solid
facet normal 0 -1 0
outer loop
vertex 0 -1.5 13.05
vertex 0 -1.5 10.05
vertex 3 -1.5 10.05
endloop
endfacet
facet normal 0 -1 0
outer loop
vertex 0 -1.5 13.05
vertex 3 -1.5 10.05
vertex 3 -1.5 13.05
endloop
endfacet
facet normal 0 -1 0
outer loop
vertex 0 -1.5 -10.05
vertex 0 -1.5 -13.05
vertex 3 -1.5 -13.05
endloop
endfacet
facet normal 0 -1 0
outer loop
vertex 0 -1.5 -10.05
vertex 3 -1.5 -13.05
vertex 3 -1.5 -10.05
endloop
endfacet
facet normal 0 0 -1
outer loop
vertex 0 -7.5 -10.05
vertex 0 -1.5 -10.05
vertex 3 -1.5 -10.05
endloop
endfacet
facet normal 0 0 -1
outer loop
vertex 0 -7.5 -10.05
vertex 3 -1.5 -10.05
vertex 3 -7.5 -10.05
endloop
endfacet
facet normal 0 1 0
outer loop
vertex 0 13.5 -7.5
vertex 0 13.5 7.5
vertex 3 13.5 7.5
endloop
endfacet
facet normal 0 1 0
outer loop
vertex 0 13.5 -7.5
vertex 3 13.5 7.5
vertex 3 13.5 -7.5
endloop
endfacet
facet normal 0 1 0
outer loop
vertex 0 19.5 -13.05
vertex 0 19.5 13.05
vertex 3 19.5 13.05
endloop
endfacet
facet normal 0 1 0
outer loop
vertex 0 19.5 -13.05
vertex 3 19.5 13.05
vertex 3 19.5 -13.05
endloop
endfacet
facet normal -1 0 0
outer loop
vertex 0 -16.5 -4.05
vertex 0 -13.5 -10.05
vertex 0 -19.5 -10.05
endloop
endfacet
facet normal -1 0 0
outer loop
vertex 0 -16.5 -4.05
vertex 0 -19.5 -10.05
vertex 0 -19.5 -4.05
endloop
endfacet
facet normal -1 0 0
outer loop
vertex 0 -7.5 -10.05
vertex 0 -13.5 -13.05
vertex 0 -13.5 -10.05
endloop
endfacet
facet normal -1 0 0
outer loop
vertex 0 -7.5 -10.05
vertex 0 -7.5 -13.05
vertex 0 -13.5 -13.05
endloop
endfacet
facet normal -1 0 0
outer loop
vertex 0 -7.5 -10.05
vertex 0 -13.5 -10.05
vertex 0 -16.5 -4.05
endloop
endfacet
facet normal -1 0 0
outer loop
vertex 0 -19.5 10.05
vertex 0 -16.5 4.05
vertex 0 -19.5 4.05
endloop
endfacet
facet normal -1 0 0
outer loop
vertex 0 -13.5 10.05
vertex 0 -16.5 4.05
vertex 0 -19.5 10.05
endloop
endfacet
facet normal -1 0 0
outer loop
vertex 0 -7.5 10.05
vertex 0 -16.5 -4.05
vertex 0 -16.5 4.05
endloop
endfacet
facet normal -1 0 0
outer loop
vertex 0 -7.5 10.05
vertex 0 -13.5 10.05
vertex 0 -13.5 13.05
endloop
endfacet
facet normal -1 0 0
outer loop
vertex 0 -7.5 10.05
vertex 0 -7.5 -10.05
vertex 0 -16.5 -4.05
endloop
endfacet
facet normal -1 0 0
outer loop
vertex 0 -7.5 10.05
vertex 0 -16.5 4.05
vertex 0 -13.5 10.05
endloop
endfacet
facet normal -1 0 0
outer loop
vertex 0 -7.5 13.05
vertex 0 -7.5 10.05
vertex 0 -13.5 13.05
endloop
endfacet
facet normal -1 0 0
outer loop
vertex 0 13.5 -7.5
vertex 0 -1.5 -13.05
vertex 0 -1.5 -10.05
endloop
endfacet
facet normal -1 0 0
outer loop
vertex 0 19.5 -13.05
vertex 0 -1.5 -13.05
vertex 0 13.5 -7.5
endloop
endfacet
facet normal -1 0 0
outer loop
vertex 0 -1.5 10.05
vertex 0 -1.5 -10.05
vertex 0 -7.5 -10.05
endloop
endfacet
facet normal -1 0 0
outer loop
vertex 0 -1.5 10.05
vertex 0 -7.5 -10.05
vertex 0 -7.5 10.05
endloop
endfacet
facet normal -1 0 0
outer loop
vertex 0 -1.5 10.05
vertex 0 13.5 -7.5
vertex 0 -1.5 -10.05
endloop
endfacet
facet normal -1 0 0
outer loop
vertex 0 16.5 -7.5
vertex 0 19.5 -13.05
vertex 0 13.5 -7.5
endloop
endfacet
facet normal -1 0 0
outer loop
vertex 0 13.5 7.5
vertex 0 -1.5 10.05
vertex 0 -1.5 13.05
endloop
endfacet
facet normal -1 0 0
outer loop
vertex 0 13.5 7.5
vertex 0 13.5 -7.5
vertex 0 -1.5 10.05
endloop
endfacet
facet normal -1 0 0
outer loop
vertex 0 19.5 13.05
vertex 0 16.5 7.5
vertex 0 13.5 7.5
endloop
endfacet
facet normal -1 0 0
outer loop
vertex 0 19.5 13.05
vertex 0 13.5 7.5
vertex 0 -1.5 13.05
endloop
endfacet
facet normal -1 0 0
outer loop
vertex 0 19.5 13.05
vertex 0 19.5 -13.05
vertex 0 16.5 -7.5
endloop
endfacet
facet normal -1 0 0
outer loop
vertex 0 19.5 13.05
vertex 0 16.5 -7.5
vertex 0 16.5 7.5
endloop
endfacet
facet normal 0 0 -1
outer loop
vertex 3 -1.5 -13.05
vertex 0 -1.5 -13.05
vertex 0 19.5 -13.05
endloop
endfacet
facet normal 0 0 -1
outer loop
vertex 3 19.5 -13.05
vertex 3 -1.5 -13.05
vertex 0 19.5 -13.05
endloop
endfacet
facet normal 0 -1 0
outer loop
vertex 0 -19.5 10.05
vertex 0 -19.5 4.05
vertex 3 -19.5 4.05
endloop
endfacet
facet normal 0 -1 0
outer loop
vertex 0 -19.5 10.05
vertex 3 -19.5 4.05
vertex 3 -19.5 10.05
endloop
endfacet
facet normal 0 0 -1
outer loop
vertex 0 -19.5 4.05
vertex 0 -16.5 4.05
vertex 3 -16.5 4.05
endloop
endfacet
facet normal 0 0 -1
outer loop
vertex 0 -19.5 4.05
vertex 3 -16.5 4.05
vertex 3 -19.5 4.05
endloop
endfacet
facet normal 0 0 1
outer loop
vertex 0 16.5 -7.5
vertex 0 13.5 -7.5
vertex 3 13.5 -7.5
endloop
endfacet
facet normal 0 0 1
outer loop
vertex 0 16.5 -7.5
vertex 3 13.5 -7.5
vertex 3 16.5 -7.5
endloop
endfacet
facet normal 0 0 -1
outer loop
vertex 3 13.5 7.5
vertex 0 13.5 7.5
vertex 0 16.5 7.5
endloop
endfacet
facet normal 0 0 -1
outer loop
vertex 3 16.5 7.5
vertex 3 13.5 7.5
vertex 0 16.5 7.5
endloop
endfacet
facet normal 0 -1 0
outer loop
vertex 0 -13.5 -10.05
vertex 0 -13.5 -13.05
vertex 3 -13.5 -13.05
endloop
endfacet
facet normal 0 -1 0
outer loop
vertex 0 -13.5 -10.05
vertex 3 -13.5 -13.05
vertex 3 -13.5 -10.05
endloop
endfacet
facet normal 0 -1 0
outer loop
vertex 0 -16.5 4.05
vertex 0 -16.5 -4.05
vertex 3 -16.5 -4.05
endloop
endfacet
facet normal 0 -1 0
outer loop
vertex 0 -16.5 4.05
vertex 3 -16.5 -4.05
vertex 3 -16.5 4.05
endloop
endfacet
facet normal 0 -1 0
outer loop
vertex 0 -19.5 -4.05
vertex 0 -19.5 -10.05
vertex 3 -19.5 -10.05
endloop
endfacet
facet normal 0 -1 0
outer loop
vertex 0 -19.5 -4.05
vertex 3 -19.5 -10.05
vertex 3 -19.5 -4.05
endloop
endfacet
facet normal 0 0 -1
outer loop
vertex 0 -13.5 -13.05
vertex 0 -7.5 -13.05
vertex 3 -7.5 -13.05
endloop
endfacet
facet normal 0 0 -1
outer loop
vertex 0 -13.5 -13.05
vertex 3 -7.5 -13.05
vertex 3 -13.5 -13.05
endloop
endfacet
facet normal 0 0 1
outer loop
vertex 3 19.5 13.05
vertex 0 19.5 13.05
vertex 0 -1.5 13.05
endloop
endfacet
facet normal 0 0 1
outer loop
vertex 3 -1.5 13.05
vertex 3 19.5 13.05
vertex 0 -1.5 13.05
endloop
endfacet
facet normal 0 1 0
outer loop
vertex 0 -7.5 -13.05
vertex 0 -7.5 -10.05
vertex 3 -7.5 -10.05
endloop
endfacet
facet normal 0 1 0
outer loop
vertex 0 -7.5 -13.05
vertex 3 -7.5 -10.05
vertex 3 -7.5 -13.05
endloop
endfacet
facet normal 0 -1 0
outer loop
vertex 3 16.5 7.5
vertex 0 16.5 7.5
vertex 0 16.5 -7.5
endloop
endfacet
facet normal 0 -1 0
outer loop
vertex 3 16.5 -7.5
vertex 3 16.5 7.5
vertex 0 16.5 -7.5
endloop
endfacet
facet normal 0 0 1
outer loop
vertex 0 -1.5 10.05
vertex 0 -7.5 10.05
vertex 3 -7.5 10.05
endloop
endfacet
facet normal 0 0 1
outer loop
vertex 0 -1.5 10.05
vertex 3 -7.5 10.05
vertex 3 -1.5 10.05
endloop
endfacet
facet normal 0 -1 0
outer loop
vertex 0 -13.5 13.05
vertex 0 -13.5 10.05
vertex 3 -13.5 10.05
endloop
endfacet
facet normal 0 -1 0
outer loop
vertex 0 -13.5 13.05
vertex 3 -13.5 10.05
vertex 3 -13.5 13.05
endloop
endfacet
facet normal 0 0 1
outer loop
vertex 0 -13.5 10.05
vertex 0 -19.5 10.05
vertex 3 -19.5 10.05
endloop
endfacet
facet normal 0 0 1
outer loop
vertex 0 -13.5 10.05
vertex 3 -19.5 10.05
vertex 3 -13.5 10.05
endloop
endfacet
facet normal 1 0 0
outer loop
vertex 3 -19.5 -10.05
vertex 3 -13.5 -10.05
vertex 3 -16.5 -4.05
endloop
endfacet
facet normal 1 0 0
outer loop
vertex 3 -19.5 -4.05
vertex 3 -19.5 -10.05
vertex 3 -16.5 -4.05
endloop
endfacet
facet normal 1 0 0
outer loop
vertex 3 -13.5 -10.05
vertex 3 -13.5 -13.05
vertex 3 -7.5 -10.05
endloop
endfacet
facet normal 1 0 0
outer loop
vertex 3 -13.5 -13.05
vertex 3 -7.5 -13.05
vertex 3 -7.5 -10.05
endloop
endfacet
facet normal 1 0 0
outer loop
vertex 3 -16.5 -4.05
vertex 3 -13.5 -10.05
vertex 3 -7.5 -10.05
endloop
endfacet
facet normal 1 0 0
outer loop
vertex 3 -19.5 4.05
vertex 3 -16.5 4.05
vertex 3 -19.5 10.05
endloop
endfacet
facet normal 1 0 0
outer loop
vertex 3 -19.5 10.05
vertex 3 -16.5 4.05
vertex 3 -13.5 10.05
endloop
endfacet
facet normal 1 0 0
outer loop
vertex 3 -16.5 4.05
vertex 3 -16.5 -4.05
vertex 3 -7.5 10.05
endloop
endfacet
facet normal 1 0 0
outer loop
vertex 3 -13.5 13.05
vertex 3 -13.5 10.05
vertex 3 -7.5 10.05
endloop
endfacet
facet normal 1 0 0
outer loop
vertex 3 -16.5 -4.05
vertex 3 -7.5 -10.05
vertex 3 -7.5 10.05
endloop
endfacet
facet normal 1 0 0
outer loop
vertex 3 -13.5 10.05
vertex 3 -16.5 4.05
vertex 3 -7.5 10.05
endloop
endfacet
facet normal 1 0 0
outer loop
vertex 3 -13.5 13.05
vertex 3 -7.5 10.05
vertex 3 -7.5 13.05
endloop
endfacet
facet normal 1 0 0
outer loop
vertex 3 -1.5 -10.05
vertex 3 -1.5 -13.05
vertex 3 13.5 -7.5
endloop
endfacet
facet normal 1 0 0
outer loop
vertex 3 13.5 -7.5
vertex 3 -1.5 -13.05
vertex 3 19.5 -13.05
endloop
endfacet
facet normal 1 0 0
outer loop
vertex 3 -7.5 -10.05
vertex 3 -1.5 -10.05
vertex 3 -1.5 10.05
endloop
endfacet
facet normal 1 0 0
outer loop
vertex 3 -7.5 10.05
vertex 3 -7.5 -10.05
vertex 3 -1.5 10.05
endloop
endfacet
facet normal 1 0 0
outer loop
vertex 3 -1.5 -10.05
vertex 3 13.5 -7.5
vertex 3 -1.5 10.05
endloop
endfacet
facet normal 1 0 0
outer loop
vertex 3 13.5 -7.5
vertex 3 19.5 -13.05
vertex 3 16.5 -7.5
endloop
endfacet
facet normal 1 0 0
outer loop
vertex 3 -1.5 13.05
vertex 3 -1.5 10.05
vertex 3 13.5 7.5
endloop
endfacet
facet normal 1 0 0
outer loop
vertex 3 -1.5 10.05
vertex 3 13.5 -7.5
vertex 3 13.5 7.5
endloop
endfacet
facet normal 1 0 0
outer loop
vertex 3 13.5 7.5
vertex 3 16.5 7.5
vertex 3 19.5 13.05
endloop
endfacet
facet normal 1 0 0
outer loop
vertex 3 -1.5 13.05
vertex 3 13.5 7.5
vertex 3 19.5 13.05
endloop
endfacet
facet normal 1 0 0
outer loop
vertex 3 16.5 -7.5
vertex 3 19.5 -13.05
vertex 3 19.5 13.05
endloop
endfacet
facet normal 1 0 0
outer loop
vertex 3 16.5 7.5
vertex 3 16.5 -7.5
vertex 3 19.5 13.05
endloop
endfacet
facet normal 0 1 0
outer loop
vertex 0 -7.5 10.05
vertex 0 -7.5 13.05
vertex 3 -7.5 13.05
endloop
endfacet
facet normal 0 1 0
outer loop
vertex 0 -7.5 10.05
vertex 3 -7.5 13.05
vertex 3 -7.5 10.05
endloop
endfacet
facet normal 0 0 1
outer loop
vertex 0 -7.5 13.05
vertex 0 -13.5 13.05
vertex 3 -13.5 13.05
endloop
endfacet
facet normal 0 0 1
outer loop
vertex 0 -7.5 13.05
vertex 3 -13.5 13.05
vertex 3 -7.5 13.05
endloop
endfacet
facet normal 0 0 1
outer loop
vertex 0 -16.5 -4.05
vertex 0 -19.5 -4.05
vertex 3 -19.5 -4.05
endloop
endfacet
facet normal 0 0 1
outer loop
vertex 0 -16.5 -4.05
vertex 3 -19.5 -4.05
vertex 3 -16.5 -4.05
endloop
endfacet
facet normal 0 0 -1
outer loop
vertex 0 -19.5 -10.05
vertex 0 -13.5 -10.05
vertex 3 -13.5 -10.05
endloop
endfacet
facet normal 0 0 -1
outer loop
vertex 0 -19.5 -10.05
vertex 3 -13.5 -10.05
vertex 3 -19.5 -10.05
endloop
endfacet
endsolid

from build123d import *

# Parameters (mm, degrees)
PAREDEESBOCO_W = 15
PAREDEESBOCO_H = 3
PAREDE_DEPTH   = 3


with BuildPart() as part:
    # ParedeEsboco → Parede (new body)
    with BuildSketch(Plane(origin=(0, 0, 0), x_dir=(0, 0, -1), z_dir=(1, 0, 0))):
        Polygon((13.05, -13.5), (10.05, -13.5), (10.05, -19.5), (4.05, -19.5), (4.05, -16.5), (-4.05, -16.5), (-4.05, -19.5), (-10.05, -19.5), (-10.05, -13.5), (-13.05, -13.5), (-13.05, -7.5), (-10.05, -7.5), (-10.05, -1.5), (-13.05, -1.5), (-13.05, 10.5), (-13.05, 19.5), (13.05, 19.5), (13.05, 10.5), (13.05, -1.5), (10.05, -1.5), (10.05, -7.5), (13.05, -7.5), align=None)
        with Locations((0, 15)):
            Rectangle(PAREDEESBOCO_W, PAREDEESBOCO_H, mode=Mode.SUBTRACT)
    extrude(amount=PAREDE_DEPTH)


solid = part.part
